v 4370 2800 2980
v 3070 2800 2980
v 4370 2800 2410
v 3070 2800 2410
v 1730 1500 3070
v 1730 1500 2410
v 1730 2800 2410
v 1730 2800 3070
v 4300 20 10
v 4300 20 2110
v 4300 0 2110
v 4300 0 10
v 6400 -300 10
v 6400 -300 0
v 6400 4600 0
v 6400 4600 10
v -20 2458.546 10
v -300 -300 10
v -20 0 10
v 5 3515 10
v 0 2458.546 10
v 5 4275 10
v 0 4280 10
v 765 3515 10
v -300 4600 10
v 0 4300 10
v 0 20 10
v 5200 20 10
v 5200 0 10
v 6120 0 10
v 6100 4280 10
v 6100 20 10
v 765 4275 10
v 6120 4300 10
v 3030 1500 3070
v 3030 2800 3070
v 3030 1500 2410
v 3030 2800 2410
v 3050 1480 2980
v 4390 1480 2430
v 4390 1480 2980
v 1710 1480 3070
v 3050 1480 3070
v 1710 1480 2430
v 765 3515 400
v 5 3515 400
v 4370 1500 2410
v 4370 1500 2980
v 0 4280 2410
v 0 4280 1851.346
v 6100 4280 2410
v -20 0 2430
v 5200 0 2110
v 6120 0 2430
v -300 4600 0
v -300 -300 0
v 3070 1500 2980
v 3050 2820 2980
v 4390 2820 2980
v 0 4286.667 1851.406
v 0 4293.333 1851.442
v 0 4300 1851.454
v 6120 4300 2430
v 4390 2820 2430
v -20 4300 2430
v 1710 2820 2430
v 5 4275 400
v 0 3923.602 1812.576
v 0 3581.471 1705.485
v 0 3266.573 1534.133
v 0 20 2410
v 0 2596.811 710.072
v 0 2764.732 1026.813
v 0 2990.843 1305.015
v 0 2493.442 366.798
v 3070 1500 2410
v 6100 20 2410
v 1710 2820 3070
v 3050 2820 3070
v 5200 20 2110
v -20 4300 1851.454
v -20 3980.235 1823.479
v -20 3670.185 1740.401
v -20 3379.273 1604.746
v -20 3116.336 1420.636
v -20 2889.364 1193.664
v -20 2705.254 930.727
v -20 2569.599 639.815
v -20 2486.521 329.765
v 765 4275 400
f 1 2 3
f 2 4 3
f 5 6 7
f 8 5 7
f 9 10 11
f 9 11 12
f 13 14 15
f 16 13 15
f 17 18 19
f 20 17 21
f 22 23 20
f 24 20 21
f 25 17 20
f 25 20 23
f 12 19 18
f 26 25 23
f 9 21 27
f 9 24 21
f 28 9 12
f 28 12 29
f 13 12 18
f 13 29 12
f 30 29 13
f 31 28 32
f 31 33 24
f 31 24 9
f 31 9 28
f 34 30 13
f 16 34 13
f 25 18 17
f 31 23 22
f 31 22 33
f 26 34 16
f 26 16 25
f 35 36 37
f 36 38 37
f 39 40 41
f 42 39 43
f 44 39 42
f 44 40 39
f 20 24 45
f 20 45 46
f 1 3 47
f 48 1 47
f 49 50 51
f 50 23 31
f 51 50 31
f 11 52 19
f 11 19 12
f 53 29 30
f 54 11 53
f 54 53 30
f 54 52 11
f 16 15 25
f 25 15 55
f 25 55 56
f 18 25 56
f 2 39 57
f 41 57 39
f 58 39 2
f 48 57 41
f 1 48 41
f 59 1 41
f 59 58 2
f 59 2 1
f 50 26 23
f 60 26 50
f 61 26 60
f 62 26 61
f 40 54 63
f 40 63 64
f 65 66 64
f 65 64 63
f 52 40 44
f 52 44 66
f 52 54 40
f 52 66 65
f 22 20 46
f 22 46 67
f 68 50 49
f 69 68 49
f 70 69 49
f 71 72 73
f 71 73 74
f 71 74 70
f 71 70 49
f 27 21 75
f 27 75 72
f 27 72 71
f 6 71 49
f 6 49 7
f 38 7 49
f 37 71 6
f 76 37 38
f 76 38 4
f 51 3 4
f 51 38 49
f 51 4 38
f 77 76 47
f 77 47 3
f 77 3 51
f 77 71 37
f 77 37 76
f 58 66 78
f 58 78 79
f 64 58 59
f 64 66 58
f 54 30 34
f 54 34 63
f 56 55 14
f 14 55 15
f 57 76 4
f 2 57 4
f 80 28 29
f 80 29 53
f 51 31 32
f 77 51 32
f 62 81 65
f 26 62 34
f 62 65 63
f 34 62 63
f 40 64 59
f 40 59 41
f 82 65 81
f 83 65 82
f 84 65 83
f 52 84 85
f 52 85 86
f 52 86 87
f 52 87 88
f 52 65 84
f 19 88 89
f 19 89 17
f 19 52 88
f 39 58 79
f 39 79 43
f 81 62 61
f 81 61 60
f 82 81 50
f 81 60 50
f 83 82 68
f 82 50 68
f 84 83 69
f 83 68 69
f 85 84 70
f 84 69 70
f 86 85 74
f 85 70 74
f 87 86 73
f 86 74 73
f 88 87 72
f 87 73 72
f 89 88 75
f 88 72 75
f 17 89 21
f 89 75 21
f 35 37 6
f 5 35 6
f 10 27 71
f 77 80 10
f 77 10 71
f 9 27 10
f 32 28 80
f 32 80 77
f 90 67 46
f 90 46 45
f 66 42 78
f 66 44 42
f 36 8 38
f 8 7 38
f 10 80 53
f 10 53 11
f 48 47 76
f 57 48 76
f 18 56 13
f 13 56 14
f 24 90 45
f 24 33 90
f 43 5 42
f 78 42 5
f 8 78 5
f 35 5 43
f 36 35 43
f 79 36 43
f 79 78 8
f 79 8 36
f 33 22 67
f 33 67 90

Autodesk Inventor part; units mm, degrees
ref_plane "YZ Plane" through (0, 0, 0) normal (1, 0, 0) x (0, 1, 0)
ref_plane "XZ Plane" through (0, 0, 0) normal (0, 1, 0) x (-1, 0, 0)
ref_plane "XY Plane" through (0, 0, 0) normal (0, 0, 1) x (1, 0, 0)
sketch "Sketch1" plane through (0, 0, 0) normal (0, 0, 1) x (1, 0, 0)
  line L0 (-300, -300) -> (6400, -300)
  line L1 (6400, -300) -> (6400, 4600)
  line L2 (6400, 4600) -> (-300, 4600)
  line L3 (-300, 4600) -> (-300, -300)
  point P0 (0, 0)
  dimension "d0" = 300
  dimension "d3" = 6700
  dimension "d5" = 4900
  dimension "d6" = 300
extrude "Extrusion1" add sketch "Sketch1" along normal blind 10
sketch "Sketch2" plane through (0, 0, 10) normal (0, 0, 1) x (1, 0, 0)
  line L0 (-300, -300) -> (6400, -300) projected
  line L1 (6400, 4600) -> (-300, 4600) projected
  line L2 (-300, 4600) -> (-300, -300) projected
  line L3 (-20, 4300) -> (0, 4300)
  line L4 (0, 4300) -> (0, 0)
  line L5 (0, 0) -> (-20, 0)
  line L6 (-20, 0) -> (-20, 4300)
  dimension "d9" = 280
  dimension "d10" = 20
  dimension "d11" = 300
  dimension "d12" = 300
extrude "Extrusion2" add sketch "Sketch2" along normal blind 2400
sketch "Sketch3" plane through (0, 0, 10) normal (0, 0, 1) x (1, 0, 0)
  line L0 (0, 4300) -> (0, 0) projected
  line L1 (0, 20) -> (6100, 20)
  line L2 (6100, 20) -> (6100, 0)
  line L3 (6100, 0) -> (0, 0)
  line L4 (0, 0) -> (0, 20)
  dimension "d15" = 6100
  dimension "d17" = 20
extrude "Extrusion3" add sketch "Sketch3" along normal blind 2400
sketch "Sketch4" plane through (0, 0, 10) normal (0, 0, 1) x (1, 0, 0)
  line L0 (6100, 0) -> (6120, 0)
  line L1 (6120, 0) -> (6120, 4300)
  line L2 (6120, 4300) -> (6100, 4300)
  line L3 (6100, 4300) -> (6100, 0)
  point P0 (0, 0)
  dimension "d20" = 20
  dimension "d22" = 4300
extrude "Extrusion4" add sketch "Sketch4" along normal blind 2400
sketch "Sketch5" plane through (0, 0, 10) normal (0, 0, 1) x (1, 0, 0)
  line L0 (0, 4300) -> (0, 20) projected
  line L1 (0, 4280) -> (6120, 4280)
  line L2 (6120, 4280) -> (6120, 4300)
  line L3 (6120, 4300) -> (0, 4300)
  line L4 (0, 4300) -> (0, 4280)
  point P0 (0, 0)
  dimension "d25" = 20
extrude "Extrusion5" add sketch "Sketch5" along normal blind 2400
sketch "Sketch6" plane through (-20, 0, 10) normal (0, -1, 0) x (1, 0, 0)
  line L0 (6140, 0) -> (0, 0) projected
  line L1 (4320, 0) -> (5220, 0)
  line L2 (5220, 0) -> (5220, 2100)
  line L3 (5220, 2100) -> (4320, 2100)
  line L4 (4320, 2100) -> (4320, 0)
  line L5 (20, 2400) -> (20, 0) projected
  point P0 (20, -10)
  dimension "d29" = 4300
  dimension "d30" = 900
  dimension "d31" = 2100
extrude "Extrusion6" cut sketch "Sketch6" along normal mid plane 40
sketch "Sketch7" plane through (0, 0, 10) normal (0, 0, 1) x (1, 0, 0)
  line L0 (6100, 4280) -> (0, 4280) projected
  line L1 (0, 4280) -> (0, 20) projected
  line L2 (5, 4275) -> (765, 4275)
  line L3 (765, 4275) -> (765, 3515)
  line L4 (765, 3515) -> (5, 3515)
  line L5 (5, 3515) -> (5, 4275)
  point P0 (0, 0)
  dimension "d34" = 760
  dimension "d36" = 760
  dimension "d37" = 5
  dimension "d38" = 5
extrude "Extrusion7" add sketch "Sketch7" along normal blind 390
sketch "Sketch8" plane through (-20, 0, 10) normal (0, -1, 0) x (1, 0, 0)
  line L0 (0, 2400) -> (6140, 2400)
  line L1 (6140, 2400) -> (6140, 2420)
  line L2 (6140, 2420) -> (0, 2420)
  line L3 (0, 2420) -> (0, 2400)
  point P0 (20, -10)
  dimension "d41" = 20
extrude "Extrusion8" add sketch "Sketch8" against normal blind 4300
sketch "Sketch9" plane through (-20, 0, 2430) normal (0, 0, 1) x (1, 0, 0)
  line L0 (0, 4300) -> (6140, 4300) projected
  line L1 (0, 0) -> (0, 4300) projected
  line L2 (1750, 2800) -> (3050, 2800)
  line L3 (3050, 2800) -> (3050, 1500)
  line L4 (3050, 1500) -> (1750, 1500)
  line L5 (1750, 1500) -> (1750, 2800)
  line L6 (1730, 2820) -> (3070, 2820)
  line L7 (3070, 2820) -> (3070, 1480)
  line L8 (3070, 1480) -> (1730, 1480)
  line L9 (1730, 1480) -> (1730, 2820)
  point P0 (20, 0)
  dimension "d45" = 1500
  dimension "d46" = 1300
  dimension "d47" = 1300
  dimension "d48" = 1750
  dimension "d49" = 20
  dimension "d50" = 20
  dimension "d51" = 20
  dimension "d52" = 20
extrude "Extrusion9" add sketch "Sketch9" along normal blind 640
sketch "Sketch10" plane through (1730, 2800, 2430) normal (0, 0, 1) x (1, 0, 0)
  line L0 (1300, -1300) -> (1300, 0) projected
  line L1 (1300, 0) -> (0, 0) projected
  line L2 (0, 0) -> (1300, 0)
  line L3 (1300, 0) -> (1300, -1300)
  line L4 (1300, -1300) -> (0, -1300)
  line L5 (0, -1300) -> (0, 0)
  point P0 (-1730, -2800)
extrude "Extrusion10" cut sketch "Sketch10" against normal blind 40
sketch "Sketch11" plane through (-20, 0, 2430) normal (0, 0, 1) x (1, 0, 0)
  line L0 (3070, 2820) -> (3070, 1480) projected
  line L1 (3070, 2820) -> (4410, 2820)
  line L2 (4410, 2820) -> (4410, 1480)
  line L3 (4410, 1480) -> (3070, 1480)
  line L4 (3070, 1480) -> (3070, 2820)
  line L5 (3090, 2800) -> (4390, 2800)
  line L6 (4390, 2800) -> (4390, 1500)
  line L7 (4390, 1500) -> (3090, 1500)
  line L8 (3090, 1500) -> (3090, 2800)
  point P0 (20, 0)
  dimension "d57" = 1340
  dimension "d59" = 20
  dimension "d60" = 20
  dimension "d61" = 20
  dimension "d62" = 20
extrude "Extrusion11" add sketch "Sketch11" along normal blind 550
sketch "Sketch12" plane through (3070, 2800, 2430) normal (0, 0, 1) x (1, 0, 0)
  line L0 (1300, -1300) -> (1300, 0) projected
  line L1 (1300, 0) -> (0, 0) projected
  line L2 (0, 0) -> (1300, 0)
  line L3 (1300, 0) -> (1300, -1300)
  line L4 (1300, -1300) -> (0, -1300)
  line L5 (0, -1300) -> (0, 0)
  point P0 (-3070, -2800)
extrude "Extrusion12" cut sketch "Sketch12" against normal blind 40
sketch "Sketch14" plane through (-20, 0, 10) normal (-1, 0, 0) x (0, 0, 1)
  line L0 (0, 0) -> (0, 4300) projected
  line L1 (0, 4300) -> (2420, 4300) projected
  arc A0 (0, 2458.5455) -> (1841.4545, 4300) centre (0, 4300) ccw
  line L2 (1841.4545, 4300) -> (0, 4300)
  line L3 (0, 4300) -> (0, 2458.5455)
  point P0 (-10, 0)
extrude "Extrusion14" cut sketch "Sketch14" along normal mid plane 40
properties part number "UL_NIST_Vents_Drawing"
